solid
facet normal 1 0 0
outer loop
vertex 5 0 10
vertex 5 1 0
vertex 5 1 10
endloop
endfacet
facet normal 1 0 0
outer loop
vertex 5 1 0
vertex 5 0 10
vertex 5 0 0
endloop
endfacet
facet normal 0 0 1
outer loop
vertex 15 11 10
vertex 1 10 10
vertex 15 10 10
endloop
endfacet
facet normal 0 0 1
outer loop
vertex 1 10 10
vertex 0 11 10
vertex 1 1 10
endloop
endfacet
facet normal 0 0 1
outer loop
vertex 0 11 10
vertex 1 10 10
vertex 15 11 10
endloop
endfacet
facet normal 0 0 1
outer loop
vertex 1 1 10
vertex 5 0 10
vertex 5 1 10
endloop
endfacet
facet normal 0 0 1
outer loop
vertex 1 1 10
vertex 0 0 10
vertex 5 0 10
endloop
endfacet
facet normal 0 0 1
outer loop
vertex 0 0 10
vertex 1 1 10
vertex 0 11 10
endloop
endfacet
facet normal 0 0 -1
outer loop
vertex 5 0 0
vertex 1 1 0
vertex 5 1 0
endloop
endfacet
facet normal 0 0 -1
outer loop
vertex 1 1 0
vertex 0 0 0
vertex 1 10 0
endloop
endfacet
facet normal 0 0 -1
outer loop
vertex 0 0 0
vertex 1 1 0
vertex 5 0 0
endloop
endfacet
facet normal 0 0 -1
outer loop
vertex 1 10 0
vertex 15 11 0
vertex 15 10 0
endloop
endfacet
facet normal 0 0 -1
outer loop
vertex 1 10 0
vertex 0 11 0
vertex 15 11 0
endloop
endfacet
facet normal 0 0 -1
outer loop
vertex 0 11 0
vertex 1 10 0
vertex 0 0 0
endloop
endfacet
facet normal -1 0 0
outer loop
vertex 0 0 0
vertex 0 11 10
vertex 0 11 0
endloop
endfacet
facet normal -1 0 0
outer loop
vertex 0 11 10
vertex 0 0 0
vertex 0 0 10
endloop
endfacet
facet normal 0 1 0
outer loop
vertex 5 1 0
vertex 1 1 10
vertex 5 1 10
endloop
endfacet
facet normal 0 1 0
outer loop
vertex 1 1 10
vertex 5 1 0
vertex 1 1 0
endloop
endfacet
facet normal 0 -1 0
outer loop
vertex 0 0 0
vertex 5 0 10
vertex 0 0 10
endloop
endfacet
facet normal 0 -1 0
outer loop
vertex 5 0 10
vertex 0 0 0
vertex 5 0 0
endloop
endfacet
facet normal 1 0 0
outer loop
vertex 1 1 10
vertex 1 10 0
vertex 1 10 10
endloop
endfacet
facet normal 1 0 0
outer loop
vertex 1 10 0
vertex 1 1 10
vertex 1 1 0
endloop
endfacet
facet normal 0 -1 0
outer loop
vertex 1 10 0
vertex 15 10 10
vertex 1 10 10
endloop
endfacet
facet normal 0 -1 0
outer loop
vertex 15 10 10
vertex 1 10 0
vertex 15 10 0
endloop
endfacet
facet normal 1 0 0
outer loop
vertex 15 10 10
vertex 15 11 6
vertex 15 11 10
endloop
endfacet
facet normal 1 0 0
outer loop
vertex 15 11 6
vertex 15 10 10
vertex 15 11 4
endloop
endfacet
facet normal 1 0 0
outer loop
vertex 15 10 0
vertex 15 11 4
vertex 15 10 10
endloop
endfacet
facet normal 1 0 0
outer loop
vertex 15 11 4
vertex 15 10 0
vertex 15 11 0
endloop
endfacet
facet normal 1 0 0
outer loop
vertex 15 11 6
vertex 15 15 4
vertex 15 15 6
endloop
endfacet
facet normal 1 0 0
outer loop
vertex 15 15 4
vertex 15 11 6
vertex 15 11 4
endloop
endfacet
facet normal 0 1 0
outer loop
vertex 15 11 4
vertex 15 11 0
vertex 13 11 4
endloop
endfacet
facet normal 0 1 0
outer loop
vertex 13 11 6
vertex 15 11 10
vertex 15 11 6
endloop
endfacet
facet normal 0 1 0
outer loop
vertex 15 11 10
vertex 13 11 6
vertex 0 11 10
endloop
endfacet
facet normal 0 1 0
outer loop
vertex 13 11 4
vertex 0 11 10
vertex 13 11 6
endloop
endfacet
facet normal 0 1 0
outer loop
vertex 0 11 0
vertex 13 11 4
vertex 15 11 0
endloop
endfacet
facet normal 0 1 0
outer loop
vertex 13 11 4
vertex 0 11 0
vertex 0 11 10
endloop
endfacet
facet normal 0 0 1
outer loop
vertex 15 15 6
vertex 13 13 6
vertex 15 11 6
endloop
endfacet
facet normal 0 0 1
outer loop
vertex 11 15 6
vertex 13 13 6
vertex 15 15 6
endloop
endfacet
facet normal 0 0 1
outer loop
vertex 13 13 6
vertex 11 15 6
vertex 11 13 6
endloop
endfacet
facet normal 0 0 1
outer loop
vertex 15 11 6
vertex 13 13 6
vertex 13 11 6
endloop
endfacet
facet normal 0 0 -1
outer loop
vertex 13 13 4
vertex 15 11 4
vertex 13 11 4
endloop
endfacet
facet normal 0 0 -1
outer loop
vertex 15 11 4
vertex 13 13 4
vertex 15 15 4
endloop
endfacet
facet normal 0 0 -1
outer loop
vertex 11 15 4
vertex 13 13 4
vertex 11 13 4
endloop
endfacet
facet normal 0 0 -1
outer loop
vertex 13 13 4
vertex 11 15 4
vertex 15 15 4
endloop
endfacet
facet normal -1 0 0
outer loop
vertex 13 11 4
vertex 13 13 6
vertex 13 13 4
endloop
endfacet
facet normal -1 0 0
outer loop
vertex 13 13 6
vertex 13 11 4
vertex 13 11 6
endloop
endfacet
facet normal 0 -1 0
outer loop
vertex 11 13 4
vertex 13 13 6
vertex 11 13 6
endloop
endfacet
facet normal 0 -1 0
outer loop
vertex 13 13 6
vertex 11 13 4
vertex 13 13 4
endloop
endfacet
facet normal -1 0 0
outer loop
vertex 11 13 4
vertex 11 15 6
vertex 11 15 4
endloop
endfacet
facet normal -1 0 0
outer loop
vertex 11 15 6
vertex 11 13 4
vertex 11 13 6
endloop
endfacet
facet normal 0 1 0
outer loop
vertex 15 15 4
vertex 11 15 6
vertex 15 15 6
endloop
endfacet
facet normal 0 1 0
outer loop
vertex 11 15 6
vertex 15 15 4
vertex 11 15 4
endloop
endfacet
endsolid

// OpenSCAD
cube([5, 1, 10]);
cube([1, 10, 10]);
translate([0, 10, 0]) cube([15, 1, 10]);

translate([13, 11, 4]) cube([2, 2, 2]);
translate([11, 13, 4]) cube([4, 2, 2]);
